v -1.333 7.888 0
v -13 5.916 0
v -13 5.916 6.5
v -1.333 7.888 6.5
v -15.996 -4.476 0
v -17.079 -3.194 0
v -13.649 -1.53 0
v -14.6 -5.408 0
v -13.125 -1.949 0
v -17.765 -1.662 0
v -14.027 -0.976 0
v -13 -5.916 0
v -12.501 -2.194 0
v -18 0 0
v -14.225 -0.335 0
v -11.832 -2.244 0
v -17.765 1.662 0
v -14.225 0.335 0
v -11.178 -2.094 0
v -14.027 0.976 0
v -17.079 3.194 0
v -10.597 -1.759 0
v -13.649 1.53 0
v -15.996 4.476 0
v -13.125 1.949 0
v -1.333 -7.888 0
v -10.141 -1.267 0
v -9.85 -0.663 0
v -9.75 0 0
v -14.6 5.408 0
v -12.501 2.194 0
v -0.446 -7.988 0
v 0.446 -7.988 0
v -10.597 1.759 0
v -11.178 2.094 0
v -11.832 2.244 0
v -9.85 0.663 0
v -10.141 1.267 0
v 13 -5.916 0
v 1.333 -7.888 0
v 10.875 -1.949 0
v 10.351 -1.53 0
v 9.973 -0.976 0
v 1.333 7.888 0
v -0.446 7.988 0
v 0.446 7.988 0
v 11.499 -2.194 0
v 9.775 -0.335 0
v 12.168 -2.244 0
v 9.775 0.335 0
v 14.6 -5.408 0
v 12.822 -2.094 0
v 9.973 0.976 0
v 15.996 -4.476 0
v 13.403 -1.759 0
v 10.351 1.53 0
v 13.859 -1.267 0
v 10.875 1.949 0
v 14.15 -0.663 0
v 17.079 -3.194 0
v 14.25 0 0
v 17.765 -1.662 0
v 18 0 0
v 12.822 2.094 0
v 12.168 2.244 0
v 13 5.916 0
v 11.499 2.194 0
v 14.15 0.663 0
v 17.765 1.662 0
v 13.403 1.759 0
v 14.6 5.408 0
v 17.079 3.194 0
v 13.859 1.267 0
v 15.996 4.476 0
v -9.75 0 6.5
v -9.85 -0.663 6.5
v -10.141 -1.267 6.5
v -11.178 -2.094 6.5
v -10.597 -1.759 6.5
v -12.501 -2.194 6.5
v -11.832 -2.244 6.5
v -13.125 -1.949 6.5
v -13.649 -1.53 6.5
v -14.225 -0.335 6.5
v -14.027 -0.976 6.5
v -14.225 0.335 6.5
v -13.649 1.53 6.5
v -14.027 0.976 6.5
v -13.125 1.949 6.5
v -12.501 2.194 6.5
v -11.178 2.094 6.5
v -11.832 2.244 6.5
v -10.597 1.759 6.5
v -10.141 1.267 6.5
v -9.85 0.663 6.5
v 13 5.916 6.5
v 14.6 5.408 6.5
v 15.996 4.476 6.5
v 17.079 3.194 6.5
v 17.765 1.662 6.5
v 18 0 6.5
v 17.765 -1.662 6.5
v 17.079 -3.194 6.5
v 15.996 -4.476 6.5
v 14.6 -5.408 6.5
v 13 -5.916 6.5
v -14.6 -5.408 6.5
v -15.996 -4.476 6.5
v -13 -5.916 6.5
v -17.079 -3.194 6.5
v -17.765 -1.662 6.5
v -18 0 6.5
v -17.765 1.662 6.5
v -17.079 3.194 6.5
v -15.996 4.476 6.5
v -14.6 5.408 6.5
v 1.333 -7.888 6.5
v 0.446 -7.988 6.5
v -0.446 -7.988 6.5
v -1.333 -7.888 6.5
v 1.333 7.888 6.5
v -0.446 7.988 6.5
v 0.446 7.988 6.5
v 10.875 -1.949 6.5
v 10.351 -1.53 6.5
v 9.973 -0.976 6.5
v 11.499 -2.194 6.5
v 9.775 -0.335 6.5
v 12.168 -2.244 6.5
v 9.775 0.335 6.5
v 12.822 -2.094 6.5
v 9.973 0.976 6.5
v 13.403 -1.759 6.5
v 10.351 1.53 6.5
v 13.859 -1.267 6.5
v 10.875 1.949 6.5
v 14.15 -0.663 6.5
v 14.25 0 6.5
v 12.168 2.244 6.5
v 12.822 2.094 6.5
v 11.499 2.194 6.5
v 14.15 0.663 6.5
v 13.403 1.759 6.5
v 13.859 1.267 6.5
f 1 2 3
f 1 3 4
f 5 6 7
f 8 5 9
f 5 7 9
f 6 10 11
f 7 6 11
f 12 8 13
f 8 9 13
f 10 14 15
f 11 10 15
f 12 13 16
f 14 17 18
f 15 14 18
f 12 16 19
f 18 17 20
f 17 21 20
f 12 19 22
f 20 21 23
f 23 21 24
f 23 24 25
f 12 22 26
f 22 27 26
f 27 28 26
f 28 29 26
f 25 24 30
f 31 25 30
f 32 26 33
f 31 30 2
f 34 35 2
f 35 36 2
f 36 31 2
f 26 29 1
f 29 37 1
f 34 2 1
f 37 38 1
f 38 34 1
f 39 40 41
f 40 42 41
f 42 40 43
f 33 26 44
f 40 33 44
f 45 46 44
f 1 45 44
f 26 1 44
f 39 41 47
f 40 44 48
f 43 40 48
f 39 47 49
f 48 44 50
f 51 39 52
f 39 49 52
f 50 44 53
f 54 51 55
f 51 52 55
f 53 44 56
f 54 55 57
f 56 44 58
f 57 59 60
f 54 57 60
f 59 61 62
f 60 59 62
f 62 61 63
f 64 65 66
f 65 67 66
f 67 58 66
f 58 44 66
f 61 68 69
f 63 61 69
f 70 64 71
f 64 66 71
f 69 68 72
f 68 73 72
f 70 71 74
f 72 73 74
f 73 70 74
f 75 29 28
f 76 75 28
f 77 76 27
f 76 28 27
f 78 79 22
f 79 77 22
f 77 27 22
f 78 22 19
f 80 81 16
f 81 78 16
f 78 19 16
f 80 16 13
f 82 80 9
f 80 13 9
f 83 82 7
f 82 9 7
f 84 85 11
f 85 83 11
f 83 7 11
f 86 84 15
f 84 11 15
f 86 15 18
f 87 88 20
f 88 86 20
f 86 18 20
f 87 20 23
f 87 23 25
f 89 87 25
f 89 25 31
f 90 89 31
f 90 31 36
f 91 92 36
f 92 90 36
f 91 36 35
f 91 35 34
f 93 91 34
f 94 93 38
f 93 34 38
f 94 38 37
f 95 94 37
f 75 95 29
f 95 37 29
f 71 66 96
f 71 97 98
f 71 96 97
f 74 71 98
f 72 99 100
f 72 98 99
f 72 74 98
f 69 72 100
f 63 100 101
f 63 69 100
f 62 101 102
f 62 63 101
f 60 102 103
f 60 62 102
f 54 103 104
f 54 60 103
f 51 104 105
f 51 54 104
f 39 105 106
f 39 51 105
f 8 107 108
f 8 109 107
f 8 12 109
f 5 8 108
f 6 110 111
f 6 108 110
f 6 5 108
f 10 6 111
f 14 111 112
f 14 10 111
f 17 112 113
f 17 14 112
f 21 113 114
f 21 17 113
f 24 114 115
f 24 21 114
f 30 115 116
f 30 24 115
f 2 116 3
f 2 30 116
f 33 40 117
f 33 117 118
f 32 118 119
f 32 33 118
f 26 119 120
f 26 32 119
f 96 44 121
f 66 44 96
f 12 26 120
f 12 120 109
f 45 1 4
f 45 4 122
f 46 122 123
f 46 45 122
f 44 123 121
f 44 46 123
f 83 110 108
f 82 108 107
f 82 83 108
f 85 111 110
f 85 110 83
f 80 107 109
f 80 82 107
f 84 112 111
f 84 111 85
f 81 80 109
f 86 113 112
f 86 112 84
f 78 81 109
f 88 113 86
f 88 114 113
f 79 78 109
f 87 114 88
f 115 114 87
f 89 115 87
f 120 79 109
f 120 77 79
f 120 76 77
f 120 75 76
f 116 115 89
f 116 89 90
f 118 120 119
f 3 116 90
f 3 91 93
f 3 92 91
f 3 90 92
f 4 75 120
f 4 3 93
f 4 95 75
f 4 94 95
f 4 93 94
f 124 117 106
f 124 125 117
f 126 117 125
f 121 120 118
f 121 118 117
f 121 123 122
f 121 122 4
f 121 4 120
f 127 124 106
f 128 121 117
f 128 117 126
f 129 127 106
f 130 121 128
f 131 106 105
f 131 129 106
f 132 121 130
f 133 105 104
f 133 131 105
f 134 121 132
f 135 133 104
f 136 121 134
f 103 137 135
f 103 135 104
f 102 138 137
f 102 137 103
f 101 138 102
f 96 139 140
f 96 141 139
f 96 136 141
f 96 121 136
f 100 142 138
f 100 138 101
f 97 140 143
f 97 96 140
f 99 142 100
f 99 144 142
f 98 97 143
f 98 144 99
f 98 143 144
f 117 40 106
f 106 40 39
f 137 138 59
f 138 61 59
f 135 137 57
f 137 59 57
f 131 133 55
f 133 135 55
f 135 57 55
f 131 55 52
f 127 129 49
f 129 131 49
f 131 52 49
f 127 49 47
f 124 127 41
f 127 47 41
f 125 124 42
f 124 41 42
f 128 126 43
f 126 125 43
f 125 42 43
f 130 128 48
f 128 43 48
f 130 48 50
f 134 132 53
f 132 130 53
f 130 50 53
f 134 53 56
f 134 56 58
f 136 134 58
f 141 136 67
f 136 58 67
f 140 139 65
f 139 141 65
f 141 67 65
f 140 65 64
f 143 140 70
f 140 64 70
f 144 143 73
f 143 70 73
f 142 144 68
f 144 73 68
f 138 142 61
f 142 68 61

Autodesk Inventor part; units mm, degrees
ref_plane "YZ Plane" through (0, 0, 0) normal (1, 0, 0) x (0, 1, 0)
ref_plane "XZ Plane" through (0, 0, 0) normal (0, 1, 0) x (-1, 0, 0)
ref_plane "XY Plane" through (0, 0, 0) normal (0, 0, 1) x (1, 0, 0)
sketch "Sketch1" plane through (0, 0, 0) normal (0, 0, 1) x (1, 0, 0)
  circle A0 centre (0, 0) radius 4 construction
  circle A1 centre (-12, 0) radius 2.25
  circle A2 centre (12, 0) radius 2.25
  line L0 (-12, 0) -> (0, 0) construction
  line L1 (12, 0) -> (0, 0) construction
  arc A3 (-13, 5.9161) -> (-13, -5.9161) centre (-12, 0) ccw
  arc A4 (13, -5.9161) -> (13, 5.9161) centre (12, 0) ccw
  line L2 (-13, 5.9161) -> (-1.3333, 7.8881)
  line L3 (1.3333, 7.8881) -> (13, 5.9161)
  line L4 (1.3333, -7.8881) -> (13, -5.9161)
  line L5 (-1.3333, -7.8881) -> (-13, -5.9161)
  arc A5 (1.3333, 7.8881) -> (-1.3333, 7.8881) centre (0, 0) ccw
  arc A6 (-1.3333, -7.8881) -> (1.3333, -7.8881) centre (0, 0) ccw
  circle A7 centre (-12, 0) radius 4.5 construction
  dimension "d0" = 8
  dimension "d2" = 4.5
  dimension "d3" = 8
  dimension "d4" = 12
  dimension "d5" = 9
  dimension "d6" = 6
extrude "Extrusion1" add sketch "Sketch1" along normal blind 6.5
properties part number "y_axis_cap" material "Plywood, Finish"
